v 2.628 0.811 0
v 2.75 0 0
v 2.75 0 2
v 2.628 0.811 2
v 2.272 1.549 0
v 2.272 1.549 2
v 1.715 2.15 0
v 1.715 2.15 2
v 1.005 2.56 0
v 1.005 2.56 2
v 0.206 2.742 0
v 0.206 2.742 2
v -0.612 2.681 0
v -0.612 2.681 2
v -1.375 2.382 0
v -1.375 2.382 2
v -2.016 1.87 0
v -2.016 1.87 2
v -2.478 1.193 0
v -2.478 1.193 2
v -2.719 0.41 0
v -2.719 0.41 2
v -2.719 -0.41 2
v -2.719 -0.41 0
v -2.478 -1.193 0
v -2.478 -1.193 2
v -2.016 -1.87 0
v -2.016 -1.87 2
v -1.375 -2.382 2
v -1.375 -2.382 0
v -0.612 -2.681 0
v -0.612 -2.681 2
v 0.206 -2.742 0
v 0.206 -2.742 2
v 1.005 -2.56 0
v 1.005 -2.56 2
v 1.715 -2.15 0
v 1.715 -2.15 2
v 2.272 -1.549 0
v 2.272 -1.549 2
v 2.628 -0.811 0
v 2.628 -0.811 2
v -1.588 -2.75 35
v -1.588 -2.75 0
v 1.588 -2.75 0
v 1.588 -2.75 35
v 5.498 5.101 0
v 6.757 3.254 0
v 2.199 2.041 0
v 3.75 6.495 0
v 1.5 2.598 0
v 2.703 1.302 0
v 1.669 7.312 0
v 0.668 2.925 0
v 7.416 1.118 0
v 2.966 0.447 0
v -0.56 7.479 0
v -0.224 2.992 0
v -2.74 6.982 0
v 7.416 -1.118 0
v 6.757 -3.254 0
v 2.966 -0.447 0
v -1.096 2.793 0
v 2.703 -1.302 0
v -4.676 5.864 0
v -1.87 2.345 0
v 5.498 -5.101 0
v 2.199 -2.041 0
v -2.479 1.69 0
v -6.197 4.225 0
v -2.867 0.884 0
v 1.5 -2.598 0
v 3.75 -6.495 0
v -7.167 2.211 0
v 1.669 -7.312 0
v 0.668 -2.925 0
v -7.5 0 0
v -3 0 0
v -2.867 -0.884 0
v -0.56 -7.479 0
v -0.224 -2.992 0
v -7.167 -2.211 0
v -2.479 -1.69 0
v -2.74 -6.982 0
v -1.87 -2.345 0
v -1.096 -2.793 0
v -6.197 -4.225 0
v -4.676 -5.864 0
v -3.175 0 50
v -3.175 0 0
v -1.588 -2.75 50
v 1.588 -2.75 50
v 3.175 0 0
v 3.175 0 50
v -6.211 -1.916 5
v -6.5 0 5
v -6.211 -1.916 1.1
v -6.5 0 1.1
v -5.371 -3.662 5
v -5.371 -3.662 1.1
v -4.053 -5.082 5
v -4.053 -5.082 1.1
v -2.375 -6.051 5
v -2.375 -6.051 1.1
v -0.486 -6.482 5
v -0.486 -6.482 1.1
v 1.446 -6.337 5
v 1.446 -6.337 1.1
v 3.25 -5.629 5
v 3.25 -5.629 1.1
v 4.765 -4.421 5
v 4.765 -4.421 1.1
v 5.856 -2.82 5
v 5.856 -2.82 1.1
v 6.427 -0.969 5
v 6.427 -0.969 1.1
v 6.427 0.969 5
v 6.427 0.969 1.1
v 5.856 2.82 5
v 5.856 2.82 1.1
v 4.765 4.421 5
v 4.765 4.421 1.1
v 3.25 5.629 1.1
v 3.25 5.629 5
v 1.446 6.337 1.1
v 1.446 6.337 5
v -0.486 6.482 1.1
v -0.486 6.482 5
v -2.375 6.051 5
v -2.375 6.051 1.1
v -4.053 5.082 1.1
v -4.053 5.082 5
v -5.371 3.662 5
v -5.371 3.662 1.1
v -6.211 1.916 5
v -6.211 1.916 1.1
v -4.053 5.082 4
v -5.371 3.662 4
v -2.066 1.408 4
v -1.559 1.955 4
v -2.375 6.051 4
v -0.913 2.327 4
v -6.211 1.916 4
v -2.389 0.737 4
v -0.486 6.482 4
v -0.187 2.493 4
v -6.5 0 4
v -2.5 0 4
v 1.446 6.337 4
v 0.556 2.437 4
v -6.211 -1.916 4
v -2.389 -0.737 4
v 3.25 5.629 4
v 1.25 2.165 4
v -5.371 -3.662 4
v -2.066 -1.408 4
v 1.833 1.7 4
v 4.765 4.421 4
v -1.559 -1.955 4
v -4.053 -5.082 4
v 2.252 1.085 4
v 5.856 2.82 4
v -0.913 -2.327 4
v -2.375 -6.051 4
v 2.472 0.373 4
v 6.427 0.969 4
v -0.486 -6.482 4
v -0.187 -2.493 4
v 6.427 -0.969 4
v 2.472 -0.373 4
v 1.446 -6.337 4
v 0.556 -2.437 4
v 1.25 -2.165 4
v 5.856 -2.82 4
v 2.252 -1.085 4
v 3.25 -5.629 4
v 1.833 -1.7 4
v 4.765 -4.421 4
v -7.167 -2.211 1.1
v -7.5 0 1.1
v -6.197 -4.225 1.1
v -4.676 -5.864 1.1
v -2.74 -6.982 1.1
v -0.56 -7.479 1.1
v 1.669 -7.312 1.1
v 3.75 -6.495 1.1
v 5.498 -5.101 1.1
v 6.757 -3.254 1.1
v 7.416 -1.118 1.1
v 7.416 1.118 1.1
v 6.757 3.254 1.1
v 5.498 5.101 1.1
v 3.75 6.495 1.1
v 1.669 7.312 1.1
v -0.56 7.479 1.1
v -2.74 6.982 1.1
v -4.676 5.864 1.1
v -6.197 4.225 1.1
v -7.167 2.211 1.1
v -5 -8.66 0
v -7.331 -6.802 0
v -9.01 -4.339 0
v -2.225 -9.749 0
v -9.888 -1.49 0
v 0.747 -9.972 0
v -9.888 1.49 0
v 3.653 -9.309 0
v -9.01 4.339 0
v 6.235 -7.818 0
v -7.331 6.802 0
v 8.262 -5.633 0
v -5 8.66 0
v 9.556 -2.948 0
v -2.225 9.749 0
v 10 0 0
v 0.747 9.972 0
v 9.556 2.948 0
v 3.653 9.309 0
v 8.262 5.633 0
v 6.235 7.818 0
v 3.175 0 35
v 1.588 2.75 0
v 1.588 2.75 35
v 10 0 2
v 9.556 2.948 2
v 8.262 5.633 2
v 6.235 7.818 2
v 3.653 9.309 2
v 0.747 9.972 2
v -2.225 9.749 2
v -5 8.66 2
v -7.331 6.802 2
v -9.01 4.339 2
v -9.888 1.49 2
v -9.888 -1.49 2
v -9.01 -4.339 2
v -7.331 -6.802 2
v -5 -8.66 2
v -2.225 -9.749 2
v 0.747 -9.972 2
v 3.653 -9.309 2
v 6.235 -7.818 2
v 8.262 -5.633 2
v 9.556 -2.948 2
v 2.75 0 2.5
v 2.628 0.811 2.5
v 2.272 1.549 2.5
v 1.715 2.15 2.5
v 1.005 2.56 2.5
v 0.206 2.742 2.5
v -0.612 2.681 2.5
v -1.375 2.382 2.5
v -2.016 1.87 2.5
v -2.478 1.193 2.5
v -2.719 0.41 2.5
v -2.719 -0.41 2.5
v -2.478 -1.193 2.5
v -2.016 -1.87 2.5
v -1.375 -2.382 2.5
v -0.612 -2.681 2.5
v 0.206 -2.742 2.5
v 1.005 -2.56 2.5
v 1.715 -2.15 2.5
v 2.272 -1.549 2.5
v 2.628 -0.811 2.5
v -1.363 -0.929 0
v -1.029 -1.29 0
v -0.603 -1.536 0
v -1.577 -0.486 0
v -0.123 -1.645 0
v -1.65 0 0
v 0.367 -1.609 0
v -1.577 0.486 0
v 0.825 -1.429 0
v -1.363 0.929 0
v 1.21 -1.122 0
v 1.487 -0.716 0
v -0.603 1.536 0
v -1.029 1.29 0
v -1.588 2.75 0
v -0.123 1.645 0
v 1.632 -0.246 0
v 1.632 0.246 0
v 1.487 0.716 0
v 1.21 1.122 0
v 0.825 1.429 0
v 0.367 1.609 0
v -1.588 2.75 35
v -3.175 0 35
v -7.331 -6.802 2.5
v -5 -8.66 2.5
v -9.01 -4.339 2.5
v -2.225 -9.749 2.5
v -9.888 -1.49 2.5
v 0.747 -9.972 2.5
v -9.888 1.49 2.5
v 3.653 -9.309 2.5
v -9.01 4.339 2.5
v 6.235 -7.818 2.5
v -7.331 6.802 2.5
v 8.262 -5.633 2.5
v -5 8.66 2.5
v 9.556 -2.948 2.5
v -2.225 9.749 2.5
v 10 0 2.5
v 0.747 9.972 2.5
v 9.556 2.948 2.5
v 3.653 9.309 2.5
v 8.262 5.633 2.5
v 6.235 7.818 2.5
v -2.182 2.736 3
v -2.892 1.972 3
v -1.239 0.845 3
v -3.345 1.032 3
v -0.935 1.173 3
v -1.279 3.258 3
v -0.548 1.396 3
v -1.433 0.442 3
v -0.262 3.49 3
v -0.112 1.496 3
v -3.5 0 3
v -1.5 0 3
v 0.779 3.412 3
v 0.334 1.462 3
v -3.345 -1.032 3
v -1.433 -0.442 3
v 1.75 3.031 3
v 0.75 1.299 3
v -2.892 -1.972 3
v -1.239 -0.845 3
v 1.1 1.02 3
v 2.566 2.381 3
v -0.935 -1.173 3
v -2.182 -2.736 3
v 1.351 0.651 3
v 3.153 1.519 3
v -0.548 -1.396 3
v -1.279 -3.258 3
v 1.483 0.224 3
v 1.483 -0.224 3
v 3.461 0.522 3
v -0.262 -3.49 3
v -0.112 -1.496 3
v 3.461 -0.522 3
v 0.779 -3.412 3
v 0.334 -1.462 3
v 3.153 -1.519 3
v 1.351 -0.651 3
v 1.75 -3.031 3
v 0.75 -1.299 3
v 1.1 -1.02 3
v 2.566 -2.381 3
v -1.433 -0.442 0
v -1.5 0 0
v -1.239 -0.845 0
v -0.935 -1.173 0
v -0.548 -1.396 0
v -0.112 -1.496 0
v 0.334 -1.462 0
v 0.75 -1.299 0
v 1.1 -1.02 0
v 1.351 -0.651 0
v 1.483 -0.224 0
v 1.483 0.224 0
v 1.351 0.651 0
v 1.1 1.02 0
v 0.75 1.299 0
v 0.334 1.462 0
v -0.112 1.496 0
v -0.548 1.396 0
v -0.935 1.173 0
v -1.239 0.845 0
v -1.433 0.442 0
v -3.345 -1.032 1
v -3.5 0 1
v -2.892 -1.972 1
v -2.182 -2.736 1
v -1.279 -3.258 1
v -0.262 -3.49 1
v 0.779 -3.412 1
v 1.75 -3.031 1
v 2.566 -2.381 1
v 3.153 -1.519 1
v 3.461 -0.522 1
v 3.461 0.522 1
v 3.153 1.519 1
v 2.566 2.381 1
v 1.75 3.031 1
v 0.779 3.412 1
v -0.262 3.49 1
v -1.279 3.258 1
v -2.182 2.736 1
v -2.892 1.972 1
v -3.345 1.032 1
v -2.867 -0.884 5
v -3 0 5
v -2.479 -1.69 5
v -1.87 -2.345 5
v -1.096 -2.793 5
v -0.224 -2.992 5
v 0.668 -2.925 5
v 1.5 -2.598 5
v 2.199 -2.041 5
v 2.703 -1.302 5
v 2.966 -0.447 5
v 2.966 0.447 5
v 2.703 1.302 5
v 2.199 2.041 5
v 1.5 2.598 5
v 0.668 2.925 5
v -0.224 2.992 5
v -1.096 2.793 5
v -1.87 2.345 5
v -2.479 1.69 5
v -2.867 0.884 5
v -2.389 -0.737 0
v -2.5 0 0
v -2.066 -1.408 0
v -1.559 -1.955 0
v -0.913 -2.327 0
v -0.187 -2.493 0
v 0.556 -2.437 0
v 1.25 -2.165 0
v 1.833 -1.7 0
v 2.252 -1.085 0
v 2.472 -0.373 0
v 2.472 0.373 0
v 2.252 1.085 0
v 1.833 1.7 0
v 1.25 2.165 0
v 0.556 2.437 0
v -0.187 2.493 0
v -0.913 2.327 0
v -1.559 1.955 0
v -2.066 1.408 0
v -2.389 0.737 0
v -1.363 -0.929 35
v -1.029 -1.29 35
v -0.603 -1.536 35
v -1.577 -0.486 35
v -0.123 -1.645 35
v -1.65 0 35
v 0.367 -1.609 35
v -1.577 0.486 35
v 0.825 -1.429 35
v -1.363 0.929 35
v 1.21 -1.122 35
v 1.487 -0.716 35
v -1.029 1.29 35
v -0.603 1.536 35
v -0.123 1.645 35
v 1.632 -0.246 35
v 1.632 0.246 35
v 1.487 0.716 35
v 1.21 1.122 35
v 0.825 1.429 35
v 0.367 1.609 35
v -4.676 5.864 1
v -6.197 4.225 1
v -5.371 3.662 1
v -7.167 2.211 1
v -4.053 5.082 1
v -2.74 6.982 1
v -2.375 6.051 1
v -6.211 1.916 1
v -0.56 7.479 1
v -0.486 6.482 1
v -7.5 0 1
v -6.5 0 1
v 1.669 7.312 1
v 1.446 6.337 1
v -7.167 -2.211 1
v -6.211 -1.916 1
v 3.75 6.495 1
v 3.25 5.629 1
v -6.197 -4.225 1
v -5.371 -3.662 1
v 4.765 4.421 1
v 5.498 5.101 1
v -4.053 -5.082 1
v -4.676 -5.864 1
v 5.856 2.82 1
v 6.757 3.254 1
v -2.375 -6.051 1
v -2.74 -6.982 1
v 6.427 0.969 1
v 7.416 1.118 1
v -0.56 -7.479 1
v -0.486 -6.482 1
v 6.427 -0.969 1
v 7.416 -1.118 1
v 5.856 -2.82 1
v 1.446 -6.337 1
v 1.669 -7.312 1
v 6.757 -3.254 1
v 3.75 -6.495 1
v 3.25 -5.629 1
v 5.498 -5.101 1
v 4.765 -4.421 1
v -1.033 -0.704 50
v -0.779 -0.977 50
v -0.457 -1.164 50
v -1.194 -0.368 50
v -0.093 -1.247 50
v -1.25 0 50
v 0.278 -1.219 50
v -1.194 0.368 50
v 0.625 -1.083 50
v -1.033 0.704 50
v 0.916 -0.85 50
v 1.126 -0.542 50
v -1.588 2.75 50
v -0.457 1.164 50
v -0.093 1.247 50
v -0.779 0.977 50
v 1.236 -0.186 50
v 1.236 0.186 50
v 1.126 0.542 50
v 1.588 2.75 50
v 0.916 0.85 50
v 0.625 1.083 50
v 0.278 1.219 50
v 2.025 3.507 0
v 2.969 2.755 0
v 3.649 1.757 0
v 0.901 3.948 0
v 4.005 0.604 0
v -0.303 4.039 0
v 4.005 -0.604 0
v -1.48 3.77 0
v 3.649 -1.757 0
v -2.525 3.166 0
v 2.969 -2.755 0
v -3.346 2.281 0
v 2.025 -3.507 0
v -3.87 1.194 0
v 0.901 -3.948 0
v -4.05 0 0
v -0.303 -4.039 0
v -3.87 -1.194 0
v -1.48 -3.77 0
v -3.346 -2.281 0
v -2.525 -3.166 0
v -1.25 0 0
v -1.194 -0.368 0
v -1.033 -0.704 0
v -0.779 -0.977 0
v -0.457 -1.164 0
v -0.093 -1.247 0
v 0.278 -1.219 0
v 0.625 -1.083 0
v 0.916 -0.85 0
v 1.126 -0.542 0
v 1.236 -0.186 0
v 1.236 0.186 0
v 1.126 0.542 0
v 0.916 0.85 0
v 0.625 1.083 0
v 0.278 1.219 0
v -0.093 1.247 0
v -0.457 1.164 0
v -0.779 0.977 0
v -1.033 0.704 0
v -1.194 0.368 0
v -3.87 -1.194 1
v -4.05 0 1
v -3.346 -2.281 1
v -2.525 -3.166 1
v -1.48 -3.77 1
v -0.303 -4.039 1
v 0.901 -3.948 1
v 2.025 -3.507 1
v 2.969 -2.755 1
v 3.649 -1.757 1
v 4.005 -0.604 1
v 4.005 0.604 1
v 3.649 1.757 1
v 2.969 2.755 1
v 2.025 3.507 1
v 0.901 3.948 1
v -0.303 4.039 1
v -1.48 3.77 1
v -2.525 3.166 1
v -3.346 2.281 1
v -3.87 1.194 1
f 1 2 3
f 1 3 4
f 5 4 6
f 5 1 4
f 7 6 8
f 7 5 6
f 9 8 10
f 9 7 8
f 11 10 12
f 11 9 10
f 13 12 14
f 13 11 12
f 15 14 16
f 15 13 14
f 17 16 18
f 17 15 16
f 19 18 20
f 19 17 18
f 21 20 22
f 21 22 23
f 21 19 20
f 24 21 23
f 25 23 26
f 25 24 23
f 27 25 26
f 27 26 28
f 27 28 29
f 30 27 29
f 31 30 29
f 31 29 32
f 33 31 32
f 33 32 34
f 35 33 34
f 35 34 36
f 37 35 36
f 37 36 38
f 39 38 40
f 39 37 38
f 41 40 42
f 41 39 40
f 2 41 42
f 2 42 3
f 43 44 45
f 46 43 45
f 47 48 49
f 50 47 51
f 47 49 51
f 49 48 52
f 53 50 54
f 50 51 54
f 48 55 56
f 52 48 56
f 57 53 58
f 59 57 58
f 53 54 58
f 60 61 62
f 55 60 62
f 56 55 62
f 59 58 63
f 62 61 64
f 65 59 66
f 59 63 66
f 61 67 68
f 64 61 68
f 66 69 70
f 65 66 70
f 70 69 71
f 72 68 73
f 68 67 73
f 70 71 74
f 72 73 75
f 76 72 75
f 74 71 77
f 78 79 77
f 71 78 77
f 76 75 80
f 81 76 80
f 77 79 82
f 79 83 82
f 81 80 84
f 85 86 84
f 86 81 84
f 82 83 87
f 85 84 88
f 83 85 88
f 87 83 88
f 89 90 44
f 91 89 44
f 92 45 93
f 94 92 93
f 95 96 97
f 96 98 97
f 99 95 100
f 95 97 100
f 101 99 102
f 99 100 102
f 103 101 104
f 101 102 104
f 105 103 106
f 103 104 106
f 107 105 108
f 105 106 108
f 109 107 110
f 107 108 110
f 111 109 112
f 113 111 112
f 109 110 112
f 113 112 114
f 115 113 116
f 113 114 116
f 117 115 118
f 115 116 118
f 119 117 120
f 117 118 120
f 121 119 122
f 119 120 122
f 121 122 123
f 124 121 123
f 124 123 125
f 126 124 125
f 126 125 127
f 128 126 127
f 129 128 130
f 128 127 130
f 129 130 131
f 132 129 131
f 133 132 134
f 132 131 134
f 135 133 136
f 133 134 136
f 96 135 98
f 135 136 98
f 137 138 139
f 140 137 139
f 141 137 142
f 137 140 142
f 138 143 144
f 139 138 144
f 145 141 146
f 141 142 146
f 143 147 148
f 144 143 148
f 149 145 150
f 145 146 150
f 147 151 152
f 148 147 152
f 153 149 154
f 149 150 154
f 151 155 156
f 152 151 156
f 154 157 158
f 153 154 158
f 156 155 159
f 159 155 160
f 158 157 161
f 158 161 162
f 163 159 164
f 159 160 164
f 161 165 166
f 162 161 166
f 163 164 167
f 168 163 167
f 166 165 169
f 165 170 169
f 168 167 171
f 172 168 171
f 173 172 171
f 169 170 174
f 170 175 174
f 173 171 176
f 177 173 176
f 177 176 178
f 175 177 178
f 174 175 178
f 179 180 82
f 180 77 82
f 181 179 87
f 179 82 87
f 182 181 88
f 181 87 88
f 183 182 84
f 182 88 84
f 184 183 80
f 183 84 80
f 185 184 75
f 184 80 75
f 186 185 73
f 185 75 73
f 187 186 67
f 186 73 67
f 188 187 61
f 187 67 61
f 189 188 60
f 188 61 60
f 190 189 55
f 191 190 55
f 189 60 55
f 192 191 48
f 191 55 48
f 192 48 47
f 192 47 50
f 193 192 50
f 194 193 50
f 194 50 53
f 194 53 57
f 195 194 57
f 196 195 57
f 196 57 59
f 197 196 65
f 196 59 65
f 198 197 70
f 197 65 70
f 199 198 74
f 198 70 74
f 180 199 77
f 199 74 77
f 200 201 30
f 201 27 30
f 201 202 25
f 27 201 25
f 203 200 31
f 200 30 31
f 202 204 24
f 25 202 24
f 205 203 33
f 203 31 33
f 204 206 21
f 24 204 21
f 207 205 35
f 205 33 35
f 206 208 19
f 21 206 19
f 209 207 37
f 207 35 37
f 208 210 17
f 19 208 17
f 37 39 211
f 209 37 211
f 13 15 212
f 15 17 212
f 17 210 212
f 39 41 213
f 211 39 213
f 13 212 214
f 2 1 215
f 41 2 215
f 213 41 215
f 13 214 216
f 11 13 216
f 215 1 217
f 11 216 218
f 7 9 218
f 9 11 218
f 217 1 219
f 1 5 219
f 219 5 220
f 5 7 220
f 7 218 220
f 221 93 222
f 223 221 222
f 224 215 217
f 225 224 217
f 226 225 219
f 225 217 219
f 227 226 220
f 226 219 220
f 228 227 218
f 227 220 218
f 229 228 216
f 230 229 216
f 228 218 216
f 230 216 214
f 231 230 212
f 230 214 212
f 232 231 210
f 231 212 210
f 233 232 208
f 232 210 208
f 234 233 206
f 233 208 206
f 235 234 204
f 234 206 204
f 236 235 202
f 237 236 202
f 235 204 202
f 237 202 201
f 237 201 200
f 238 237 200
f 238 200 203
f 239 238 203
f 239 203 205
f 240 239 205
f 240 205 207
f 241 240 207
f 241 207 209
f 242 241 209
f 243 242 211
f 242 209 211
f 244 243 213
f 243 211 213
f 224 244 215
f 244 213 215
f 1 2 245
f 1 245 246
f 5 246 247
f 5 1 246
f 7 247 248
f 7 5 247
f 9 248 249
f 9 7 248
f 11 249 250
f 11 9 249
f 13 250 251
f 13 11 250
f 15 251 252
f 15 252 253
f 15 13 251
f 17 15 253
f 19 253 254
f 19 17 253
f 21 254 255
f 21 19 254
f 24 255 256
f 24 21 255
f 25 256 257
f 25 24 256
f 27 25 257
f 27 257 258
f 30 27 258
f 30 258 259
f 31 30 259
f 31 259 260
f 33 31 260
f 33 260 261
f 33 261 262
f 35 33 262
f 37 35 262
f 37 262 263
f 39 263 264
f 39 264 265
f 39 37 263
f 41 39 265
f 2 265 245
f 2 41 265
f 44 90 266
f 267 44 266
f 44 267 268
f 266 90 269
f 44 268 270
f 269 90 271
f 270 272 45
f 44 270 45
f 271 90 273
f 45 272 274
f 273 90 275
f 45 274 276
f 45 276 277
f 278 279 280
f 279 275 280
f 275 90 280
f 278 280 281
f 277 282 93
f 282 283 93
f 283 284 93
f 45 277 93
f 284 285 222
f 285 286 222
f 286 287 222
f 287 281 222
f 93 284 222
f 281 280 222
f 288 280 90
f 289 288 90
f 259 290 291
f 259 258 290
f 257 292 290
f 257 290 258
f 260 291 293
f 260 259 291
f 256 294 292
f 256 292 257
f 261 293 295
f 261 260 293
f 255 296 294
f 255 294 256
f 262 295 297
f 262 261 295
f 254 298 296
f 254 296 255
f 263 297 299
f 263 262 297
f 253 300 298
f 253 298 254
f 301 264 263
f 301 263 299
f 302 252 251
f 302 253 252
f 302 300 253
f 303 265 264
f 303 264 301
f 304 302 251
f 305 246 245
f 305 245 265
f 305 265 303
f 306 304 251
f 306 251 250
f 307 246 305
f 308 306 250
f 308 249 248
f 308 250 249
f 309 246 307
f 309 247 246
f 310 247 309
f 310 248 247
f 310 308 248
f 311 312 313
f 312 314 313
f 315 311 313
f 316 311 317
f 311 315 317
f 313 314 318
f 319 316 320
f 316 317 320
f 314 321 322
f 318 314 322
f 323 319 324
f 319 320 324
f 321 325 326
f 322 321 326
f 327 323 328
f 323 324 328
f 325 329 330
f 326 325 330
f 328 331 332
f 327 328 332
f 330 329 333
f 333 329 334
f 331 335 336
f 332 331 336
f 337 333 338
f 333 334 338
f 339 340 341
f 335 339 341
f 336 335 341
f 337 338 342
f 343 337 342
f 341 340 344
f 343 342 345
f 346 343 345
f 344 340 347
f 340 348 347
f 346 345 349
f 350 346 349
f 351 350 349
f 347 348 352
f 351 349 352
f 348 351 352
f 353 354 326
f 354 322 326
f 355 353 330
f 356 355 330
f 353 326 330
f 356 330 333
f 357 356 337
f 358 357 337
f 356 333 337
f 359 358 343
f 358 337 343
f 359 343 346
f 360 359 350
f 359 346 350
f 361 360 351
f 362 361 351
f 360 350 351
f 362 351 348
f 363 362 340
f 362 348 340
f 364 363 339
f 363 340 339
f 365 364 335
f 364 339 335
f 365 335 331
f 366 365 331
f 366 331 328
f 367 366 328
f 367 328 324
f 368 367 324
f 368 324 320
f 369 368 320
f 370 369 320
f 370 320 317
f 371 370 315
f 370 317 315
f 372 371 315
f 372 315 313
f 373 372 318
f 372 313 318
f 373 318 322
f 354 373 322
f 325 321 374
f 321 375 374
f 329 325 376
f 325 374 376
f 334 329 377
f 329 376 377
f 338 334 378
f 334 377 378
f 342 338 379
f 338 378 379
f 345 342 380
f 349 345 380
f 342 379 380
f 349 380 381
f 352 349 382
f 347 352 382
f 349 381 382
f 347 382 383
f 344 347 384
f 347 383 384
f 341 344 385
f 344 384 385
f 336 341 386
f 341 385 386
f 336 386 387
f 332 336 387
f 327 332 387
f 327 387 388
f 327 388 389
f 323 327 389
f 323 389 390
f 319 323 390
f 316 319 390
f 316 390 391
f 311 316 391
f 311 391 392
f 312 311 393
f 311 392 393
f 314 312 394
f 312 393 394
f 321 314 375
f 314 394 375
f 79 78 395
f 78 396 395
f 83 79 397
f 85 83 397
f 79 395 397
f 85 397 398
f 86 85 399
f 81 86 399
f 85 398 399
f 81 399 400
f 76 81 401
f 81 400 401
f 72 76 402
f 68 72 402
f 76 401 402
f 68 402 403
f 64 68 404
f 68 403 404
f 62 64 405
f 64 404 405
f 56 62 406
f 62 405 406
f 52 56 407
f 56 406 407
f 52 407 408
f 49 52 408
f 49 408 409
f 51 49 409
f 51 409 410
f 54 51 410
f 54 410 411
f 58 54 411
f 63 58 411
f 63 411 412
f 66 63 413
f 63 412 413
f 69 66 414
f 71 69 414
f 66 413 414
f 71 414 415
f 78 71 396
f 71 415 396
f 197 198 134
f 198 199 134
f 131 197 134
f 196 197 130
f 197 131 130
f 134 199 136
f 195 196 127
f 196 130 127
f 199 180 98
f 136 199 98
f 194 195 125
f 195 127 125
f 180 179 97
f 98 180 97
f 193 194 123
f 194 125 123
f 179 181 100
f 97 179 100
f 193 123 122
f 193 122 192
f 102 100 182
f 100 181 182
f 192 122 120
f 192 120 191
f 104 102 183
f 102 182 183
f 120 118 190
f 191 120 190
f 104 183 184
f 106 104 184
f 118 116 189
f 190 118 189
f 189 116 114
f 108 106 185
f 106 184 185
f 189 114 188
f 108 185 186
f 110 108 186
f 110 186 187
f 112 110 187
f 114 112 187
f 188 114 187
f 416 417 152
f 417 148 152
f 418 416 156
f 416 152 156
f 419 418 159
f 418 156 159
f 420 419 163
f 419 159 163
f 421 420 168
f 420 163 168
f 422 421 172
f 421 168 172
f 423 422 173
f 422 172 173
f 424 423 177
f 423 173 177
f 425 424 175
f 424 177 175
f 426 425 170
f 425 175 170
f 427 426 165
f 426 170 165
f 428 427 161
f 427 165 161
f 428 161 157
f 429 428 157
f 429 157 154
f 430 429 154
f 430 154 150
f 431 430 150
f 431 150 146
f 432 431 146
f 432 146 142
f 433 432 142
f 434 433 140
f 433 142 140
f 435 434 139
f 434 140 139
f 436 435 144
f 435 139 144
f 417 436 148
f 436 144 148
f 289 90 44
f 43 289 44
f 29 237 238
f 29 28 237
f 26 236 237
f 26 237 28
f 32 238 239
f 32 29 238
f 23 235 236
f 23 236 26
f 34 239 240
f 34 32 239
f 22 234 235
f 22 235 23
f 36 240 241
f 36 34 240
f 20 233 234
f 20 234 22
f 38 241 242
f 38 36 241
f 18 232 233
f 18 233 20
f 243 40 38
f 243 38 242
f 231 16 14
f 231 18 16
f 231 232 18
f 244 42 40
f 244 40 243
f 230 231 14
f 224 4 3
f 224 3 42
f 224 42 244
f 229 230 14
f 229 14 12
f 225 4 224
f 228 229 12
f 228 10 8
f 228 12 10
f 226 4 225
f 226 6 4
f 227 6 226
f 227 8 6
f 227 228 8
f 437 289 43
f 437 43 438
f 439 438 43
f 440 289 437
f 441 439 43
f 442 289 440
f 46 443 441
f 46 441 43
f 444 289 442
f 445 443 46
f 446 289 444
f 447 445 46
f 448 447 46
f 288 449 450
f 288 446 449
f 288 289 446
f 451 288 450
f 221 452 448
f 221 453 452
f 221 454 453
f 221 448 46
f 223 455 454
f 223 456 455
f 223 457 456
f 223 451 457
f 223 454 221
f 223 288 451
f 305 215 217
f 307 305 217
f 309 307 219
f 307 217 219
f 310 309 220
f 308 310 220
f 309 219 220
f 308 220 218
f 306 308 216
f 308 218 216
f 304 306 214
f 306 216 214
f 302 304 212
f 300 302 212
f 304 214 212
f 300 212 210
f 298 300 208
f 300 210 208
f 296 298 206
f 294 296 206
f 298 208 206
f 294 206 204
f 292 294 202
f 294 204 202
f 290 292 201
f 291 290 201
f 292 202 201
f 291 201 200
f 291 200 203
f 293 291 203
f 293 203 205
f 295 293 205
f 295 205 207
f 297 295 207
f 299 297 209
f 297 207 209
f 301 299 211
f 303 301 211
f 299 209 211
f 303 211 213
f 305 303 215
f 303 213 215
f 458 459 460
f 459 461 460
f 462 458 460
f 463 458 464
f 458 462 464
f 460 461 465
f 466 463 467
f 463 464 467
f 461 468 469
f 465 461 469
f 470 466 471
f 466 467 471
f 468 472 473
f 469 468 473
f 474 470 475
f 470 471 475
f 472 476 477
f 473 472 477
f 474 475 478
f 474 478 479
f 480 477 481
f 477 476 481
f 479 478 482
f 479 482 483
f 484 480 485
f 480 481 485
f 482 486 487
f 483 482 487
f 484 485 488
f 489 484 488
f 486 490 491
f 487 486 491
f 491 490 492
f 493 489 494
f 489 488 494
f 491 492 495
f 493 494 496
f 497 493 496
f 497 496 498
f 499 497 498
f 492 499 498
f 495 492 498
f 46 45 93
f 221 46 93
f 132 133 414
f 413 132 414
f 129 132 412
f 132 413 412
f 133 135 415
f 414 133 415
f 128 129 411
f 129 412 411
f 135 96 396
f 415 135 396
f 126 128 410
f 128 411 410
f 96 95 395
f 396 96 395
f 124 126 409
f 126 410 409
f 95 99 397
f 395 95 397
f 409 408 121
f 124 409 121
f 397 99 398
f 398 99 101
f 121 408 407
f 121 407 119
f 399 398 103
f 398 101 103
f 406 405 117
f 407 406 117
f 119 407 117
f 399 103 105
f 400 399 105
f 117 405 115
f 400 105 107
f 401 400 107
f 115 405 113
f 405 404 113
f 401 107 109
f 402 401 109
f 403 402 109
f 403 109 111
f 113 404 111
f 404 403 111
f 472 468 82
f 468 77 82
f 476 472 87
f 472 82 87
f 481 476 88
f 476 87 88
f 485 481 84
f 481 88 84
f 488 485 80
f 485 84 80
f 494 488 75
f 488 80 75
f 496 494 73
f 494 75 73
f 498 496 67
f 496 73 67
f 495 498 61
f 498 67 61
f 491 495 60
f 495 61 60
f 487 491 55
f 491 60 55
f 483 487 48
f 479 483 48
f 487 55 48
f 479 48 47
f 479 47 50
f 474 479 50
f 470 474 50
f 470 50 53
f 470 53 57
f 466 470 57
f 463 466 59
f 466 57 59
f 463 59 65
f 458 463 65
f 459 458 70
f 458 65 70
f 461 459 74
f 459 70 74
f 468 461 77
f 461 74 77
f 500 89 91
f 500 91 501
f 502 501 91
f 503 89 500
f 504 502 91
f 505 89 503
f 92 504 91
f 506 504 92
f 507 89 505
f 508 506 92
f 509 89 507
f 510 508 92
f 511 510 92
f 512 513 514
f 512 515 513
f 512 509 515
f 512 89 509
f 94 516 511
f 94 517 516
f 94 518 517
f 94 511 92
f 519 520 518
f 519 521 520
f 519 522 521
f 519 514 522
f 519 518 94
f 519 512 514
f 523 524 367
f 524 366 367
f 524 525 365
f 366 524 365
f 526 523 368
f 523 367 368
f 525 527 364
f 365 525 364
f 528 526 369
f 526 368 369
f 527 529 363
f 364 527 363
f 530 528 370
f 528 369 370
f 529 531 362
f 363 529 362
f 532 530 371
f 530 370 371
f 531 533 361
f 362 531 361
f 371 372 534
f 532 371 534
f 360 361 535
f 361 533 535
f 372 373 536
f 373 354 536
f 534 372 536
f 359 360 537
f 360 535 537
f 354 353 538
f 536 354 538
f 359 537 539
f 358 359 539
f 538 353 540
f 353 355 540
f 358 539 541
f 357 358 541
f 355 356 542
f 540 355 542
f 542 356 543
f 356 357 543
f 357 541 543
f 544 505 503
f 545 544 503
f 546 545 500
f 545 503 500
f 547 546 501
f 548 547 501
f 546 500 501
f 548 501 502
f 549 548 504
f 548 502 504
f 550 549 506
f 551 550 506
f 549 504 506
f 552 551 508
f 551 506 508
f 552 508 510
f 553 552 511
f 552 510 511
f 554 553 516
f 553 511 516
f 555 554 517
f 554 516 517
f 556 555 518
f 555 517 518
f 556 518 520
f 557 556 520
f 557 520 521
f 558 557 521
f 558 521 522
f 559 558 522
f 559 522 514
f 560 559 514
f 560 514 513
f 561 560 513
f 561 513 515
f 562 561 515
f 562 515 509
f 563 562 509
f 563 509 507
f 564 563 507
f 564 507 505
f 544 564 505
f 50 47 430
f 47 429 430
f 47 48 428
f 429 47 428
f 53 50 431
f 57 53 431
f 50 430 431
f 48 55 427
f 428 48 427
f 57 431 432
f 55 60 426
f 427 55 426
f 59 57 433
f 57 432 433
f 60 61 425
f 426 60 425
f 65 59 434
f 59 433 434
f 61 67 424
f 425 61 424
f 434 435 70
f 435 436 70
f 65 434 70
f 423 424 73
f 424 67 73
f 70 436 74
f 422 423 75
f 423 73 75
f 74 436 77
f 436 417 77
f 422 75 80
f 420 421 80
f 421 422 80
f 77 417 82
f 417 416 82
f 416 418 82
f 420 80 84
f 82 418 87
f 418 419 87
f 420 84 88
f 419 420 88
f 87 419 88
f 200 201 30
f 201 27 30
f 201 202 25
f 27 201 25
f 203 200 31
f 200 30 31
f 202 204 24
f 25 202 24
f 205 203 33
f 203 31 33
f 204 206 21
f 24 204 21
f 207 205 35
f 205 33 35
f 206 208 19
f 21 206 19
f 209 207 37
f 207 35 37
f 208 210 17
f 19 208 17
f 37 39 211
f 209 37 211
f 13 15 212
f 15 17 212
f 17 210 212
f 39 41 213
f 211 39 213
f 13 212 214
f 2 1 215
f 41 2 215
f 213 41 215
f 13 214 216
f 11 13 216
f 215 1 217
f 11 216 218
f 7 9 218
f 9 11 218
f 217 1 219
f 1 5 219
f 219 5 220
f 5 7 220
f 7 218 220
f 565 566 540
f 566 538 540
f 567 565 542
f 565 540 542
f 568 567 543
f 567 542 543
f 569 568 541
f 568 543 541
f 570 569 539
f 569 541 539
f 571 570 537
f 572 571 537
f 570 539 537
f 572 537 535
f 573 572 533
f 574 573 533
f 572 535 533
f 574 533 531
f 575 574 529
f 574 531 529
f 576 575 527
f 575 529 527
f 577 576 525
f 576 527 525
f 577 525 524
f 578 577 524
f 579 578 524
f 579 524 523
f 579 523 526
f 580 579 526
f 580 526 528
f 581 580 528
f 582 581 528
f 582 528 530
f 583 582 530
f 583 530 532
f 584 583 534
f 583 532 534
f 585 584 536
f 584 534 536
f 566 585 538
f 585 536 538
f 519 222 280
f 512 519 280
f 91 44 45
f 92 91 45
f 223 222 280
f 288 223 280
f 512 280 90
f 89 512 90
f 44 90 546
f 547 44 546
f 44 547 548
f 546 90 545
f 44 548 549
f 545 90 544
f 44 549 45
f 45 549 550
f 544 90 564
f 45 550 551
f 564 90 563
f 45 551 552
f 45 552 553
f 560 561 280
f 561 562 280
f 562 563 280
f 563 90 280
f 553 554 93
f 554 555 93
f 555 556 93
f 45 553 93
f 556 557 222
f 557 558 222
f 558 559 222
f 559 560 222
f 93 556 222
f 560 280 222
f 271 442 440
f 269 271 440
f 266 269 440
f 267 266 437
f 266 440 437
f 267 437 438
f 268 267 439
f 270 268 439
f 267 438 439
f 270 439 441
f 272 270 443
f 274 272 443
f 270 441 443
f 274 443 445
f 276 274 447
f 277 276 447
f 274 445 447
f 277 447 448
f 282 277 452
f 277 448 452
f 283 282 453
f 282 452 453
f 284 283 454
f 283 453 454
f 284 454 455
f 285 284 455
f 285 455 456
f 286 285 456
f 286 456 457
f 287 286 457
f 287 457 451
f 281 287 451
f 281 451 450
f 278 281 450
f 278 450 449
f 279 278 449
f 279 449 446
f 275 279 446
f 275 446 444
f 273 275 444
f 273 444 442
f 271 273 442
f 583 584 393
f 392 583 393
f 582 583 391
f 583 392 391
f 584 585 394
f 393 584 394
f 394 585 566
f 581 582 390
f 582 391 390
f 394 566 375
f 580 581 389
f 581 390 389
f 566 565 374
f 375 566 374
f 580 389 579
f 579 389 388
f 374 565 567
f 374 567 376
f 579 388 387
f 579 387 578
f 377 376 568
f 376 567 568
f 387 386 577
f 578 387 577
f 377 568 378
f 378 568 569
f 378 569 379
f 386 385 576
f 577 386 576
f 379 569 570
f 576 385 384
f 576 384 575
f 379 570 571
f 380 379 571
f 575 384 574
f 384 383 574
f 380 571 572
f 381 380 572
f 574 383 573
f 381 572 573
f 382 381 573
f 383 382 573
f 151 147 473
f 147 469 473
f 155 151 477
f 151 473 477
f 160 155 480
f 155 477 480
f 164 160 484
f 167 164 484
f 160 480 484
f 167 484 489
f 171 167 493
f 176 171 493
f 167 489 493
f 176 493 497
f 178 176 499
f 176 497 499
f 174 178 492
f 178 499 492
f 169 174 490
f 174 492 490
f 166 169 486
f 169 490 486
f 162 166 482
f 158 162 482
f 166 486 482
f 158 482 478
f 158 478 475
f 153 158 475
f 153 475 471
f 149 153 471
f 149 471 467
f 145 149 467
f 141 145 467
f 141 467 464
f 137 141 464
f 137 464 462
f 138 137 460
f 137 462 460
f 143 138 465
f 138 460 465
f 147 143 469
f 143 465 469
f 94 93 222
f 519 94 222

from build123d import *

# Parameters (mm, degrees)
F1_DEPTH  = 50
F2_D      = 2.5
F7_DEPTH  = 35
F8_D      = 3.3
F11_R     = 10
F11_R_2   = 2.75
F12_DEPTH = 2.5
F13_DEPTH = 2


with BuildPart() as f1:
    # F0 (on Top) → F1 (new body)
    with BuildSketch(Plane.XY):
        Polygon((-1.5877132403, -2.75), (1.5877132403, -2.75), (3.1754264805, 0), (1.5877132403, 2.75), (-1.5877132403, 2.75), (-3.1754264805, 0), align=None)
    extrude(amount=F1_DEPTH)

    # F2 (through all)
    with Locations(Plane(origin=(0, 0, 0), x_dir=(1, 0, 0), z_dir=(0, 0, -1))):
        with Locations((0, 0)):
            Hole(F2_D / 2)


with BuildPart() as f4:
    # F3 (on Front) → F4 (revolve)
    with BuildSketch(Plane.XZ):
        Polygon((-3, 5), (-6.5, 5), (-6.5, 1.1), (-7.5, 1.1), (-7.5, 0), (-3, 0), align=None)
    revolve(axis=Axis((0, 0, 3.7545025419), (0, 0, 1)))


with BuildPart() as f6:
    # F5 (on Front) → F6 (revolve)
    with BuildSketch(Plane.XZ):
        Polygon((-7.5, 0), (-2.5, 0), (-2.5, 4), (-6.5, 4), (-6.5, 1), (-7.5, 1), align=None)
    revolve(axis=Axis((0, 0, 3.5518463739), (0, 0, 1)))


with BuildPart() as f7:
    # F0 (on Top) → F7 (new body)
    with BuildSketch(Plane.XY):
        Polygon((-1.5877132403, -2.75), (1.5877132403, -2.75), (3.1754264805, 0), (1.5877132403, 2.75), (-1.5877132403, 2.75), (-3.1754264805, 0), align=None)
    extrude(amount=F7_DEPTH)

    # F8 (through all)
    with Locations(Plane(origin=(0, 0, 0), x_dir=(1, 0, 0), z_dir=(0, 0, -1))):
        with Locations((0, 0)):
            Hole(F8_D / 2)


with BuildPart() as f10:
    # F9 (on Front) → F10 (revolve)
    with BuildSketch(Plane.XZ):
        Polygon((-4.05, 0), (-1.5, 0), (-1.5, 3), (-3.5, 3), (-3.5, 1), (-4.05, 1), align=None)
    revolve(axis=Axis((0, 0, 2.1486662607), (0, 0, 1)))


with BuildPart() as f12:
    # F11 (on Top) → F12 (new body)
    with BuildSketch(Plane.XY):
        Circle(F11_R)
        Circle(F11_R_2, mode=Mode.SUBTRACT)
    extrude(amount=F12_DEPTH)


with BuildPart() as f13:
    # F11 (on Top) → F13 (new body)
    with BuildSketch(Plane.XY):
        Circle(F11_R)
        Circle(F11_R_2, mode=Mode.SUBTRACT)
    extrude(amount=F13_DEPTH)


solid = Compound([f1.part, f4.part, f6.part, f7.part, f10.part, f12.part, f13.part])
